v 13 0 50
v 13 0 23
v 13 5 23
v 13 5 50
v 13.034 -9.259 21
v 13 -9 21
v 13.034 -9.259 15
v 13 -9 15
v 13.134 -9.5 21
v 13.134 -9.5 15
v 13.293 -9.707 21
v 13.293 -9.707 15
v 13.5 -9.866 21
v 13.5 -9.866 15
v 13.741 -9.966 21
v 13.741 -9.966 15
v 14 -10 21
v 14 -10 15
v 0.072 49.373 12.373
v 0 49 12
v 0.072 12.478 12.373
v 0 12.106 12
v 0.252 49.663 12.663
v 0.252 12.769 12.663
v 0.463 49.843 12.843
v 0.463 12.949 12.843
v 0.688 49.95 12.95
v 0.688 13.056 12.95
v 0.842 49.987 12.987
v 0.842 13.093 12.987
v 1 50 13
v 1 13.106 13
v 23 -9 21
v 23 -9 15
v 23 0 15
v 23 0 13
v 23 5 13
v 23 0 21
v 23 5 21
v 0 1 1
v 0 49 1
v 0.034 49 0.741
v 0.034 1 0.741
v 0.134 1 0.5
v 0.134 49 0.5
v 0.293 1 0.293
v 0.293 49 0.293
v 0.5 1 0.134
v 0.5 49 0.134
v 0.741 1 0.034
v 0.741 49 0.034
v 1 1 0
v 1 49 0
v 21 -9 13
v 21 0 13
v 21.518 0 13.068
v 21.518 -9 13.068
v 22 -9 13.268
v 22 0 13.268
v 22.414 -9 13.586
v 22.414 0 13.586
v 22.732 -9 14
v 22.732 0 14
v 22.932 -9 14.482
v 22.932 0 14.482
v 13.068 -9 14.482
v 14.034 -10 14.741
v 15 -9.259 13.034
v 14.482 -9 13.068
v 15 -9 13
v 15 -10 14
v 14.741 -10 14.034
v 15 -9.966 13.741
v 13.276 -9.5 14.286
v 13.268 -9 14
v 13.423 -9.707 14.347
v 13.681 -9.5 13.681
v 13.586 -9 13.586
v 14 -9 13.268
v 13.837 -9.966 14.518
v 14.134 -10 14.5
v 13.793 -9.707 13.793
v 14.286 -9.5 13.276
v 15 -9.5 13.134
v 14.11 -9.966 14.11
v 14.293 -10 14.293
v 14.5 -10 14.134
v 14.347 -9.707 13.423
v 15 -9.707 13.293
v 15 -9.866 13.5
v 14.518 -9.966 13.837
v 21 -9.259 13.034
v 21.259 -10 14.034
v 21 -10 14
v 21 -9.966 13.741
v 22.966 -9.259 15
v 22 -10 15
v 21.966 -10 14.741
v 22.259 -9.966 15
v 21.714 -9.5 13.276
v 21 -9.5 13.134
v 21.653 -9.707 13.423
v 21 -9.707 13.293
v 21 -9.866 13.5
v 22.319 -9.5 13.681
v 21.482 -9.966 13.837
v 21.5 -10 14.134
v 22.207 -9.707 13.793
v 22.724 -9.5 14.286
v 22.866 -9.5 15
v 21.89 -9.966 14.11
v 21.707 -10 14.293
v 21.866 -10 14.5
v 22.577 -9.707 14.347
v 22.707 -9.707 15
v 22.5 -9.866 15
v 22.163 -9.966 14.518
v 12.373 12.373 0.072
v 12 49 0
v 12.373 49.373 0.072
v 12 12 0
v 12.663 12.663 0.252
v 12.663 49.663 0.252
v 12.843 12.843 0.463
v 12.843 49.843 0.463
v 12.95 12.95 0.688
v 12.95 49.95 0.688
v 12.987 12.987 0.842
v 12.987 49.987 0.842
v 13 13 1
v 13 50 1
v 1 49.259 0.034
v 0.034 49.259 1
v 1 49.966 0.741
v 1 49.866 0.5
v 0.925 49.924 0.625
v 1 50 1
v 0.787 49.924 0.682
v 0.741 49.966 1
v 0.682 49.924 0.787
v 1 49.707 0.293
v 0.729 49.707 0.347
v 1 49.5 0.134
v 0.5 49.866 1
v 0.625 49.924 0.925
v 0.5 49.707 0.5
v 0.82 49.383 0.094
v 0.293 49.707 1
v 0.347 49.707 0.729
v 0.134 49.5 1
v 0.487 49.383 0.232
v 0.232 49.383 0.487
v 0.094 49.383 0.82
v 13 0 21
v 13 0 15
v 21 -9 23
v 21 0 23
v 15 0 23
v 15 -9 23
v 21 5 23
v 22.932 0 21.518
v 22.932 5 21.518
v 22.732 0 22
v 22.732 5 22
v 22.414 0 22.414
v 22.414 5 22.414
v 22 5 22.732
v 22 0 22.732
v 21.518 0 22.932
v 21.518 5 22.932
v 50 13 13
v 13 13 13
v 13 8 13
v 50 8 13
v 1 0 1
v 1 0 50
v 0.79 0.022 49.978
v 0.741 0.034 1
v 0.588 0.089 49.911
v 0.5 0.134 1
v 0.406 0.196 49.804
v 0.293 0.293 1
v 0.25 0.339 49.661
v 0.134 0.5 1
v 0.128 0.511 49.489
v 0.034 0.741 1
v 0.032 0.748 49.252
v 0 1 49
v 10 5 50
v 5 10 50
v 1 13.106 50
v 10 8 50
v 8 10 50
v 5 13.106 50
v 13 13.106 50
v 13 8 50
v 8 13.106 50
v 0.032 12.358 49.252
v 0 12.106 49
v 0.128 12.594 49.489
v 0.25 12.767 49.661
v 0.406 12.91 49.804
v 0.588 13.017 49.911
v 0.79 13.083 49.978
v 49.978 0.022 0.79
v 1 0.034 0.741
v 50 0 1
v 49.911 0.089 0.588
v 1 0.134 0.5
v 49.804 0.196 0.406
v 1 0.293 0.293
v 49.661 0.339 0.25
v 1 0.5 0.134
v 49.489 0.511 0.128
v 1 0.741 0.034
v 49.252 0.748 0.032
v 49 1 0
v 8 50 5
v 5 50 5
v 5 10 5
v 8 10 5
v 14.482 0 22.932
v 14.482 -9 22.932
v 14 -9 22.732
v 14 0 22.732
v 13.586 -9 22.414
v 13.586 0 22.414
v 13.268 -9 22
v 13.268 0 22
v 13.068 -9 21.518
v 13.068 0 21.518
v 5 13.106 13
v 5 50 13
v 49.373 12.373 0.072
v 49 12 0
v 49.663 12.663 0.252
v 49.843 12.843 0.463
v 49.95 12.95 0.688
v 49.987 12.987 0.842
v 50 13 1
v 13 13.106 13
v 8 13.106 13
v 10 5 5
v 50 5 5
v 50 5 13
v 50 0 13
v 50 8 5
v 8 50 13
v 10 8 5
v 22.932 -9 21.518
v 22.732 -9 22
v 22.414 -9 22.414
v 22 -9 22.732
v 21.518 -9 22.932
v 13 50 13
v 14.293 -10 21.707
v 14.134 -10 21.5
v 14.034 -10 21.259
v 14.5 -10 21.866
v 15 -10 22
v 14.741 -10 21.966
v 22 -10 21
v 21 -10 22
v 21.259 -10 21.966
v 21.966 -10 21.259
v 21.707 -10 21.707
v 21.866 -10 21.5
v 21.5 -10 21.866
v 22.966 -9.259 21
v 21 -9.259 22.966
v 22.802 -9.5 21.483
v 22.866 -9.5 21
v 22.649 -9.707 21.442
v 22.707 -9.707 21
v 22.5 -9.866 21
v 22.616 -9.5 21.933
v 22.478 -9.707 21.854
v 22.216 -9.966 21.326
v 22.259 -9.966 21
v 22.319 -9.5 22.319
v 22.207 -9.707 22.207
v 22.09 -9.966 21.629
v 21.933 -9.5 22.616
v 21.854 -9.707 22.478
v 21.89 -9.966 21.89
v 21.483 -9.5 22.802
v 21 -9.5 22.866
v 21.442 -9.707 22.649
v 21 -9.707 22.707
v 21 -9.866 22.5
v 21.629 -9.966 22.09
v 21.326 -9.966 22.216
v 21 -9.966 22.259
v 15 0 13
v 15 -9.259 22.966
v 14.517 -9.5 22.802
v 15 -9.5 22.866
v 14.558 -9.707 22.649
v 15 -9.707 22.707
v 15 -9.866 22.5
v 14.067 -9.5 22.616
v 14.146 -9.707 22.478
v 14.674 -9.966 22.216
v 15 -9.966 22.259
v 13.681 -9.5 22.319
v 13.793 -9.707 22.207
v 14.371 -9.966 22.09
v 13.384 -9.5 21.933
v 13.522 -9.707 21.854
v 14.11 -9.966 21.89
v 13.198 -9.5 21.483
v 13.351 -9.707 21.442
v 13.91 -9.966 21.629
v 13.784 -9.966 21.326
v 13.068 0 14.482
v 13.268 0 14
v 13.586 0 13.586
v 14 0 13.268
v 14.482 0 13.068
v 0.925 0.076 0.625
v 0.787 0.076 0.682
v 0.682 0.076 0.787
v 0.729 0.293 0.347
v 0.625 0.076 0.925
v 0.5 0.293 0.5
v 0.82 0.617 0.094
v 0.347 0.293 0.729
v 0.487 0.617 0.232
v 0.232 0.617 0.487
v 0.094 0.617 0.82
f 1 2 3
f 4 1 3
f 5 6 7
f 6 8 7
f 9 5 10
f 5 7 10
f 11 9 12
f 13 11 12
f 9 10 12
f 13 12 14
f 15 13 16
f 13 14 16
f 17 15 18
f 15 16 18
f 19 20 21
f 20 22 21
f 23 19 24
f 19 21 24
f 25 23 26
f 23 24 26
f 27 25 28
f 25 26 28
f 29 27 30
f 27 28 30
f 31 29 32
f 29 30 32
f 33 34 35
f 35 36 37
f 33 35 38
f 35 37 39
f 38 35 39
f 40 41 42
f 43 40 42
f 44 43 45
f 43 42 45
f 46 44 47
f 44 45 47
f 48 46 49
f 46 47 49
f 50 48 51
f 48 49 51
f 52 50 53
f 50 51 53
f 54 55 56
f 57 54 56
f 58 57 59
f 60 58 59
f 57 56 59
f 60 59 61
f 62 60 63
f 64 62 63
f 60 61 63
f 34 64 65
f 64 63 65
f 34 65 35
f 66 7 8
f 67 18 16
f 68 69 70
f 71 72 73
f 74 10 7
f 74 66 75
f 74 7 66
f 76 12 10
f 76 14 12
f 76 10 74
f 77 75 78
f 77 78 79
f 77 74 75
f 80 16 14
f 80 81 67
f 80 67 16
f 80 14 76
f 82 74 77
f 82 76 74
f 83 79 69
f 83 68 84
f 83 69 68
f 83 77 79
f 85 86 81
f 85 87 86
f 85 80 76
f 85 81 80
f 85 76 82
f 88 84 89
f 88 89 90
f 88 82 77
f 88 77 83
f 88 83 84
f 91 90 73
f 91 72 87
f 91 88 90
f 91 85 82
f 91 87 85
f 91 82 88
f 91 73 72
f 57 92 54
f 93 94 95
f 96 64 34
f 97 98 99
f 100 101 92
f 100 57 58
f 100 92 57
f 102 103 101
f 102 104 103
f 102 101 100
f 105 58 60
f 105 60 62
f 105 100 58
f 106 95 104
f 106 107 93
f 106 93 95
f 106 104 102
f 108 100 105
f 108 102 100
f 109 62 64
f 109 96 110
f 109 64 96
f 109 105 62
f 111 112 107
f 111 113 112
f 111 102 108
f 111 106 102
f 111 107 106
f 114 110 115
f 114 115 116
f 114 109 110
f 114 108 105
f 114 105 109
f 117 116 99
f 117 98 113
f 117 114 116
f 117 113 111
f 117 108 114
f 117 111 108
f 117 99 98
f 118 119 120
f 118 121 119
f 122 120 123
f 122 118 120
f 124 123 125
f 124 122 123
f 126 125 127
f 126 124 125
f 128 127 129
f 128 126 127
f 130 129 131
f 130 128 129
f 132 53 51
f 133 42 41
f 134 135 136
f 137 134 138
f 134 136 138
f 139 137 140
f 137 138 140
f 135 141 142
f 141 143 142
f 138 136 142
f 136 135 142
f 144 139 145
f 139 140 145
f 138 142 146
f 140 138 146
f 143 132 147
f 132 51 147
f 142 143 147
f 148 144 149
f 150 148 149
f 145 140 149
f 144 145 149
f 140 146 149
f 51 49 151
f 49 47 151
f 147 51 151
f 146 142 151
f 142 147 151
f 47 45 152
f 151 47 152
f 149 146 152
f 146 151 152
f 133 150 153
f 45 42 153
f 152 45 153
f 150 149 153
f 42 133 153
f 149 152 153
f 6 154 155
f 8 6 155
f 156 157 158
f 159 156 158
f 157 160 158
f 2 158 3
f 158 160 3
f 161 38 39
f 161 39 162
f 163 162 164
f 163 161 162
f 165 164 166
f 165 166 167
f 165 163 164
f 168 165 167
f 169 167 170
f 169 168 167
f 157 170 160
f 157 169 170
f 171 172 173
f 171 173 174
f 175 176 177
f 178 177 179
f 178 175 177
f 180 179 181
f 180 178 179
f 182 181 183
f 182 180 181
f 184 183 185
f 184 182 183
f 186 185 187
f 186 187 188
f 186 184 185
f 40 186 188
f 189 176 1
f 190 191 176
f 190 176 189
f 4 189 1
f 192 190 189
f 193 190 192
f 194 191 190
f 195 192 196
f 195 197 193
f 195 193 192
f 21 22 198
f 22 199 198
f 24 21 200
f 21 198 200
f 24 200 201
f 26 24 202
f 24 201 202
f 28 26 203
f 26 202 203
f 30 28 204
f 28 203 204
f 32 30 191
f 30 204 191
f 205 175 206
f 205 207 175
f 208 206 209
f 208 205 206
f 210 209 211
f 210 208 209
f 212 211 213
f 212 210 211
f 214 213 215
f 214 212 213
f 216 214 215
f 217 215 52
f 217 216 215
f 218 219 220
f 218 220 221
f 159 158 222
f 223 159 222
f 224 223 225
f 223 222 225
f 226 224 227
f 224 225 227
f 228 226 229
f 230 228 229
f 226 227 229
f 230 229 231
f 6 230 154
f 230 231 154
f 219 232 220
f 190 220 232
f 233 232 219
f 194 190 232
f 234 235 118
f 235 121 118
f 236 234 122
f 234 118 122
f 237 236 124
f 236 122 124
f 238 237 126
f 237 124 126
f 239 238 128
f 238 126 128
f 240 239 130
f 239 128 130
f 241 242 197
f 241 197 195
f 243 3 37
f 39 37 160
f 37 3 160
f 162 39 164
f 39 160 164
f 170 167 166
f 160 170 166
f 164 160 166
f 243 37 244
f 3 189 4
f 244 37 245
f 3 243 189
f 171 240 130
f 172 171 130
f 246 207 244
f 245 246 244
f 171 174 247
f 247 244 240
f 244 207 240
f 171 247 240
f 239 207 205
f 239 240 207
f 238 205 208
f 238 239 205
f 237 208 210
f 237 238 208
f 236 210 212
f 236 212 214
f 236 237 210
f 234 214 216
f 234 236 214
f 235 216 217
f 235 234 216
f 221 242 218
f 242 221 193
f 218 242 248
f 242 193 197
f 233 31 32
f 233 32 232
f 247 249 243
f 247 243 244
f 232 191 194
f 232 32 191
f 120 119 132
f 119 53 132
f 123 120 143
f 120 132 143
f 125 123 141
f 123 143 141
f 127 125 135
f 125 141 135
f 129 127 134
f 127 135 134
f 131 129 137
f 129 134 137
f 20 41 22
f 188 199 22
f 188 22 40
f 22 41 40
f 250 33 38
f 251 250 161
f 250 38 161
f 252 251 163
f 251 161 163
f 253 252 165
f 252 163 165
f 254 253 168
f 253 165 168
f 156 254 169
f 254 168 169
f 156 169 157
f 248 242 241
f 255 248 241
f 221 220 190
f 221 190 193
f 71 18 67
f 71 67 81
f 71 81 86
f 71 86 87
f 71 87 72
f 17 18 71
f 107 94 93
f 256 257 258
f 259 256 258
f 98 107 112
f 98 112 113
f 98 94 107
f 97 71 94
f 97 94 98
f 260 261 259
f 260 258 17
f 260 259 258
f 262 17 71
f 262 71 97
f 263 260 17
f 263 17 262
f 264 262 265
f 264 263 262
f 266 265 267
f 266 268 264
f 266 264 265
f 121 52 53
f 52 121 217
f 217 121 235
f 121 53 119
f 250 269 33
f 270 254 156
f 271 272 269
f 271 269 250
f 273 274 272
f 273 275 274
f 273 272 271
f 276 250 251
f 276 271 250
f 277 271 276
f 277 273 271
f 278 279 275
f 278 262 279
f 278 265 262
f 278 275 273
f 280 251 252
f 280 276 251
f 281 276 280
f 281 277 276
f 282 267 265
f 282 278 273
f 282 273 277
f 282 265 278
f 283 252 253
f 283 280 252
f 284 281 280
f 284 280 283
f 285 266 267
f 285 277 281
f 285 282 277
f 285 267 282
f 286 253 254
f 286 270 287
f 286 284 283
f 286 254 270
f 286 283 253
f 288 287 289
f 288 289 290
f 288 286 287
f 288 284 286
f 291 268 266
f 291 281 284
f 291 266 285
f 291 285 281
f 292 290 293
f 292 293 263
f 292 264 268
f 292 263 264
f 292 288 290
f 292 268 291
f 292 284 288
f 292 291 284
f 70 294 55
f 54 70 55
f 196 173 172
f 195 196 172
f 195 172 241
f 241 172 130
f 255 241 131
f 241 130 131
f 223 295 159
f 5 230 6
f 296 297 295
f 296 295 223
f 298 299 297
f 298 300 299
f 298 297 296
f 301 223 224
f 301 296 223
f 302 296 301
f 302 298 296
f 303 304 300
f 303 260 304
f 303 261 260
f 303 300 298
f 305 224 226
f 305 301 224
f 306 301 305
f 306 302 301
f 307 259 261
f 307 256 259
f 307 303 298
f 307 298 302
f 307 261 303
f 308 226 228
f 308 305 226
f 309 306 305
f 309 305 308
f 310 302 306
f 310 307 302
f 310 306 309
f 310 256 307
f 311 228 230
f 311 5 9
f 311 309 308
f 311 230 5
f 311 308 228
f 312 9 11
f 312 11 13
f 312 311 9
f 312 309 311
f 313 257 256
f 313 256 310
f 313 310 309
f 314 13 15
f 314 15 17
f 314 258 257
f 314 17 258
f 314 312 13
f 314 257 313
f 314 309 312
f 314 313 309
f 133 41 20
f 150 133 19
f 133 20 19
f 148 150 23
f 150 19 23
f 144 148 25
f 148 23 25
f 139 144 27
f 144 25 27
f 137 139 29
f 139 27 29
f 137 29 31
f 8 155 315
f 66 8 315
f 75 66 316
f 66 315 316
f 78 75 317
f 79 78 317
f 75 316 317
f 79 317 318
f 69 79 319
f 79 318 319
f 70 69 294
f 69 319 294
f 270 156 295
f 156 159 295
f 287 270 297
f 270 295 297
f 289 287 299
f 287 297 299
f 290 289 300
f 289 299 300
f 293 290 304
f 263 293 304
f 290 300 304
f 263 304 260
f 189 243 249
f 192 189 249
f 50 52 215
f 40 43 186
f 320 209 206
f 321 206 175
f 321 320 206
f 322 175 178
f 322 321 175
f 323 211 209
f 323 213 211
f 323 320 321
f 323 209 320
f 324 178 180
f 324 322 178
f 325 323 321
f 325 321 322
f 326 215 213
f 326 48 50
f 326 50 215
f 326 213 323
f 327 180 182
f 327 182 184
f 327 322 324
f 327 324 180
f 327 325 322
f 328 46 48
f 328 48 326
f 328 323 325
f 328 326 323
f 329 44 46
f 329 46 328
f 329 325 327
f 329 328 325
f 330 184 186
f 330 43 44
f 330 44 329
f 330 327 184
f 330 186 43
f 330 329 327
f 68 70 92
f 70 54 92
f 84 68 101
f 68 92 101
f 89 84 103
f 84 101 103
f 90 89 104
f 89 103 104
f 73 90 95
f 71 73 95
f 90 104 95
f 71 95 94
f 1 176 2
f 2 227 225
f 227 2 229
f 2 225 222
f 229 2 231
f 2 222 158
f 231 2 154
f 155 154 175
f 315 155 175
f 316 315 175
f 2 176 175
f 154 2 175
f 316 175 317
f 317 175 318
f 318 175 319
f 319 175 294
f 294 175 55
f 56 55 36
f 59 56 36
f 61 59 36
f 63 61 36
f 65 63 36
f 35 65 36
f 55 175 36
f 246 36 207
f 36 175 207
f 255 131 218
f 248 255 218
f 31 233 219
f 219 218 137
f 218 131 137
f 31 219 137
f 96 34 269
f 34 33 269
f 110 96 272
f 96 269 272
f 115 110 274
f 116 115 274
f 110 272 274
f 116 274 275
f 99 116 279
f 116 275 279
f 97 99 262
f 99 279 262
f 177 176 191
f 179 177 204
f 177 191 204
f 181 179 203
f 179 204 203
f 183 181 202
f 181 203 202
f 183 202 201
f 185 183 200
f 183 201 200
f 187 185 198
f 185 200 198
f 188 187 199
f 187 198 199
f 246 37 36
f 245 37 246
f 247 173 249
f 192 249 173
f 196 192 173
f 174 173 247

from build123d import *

# Parameters (mm, degrees)
PAD_DEPTH     = 13
SKETCH001_W   = 13
SKETCH001_H   = 13.105825
PAD001_DEPTH  = 50
SKETCH002_W   = 70.608528
SKETCH002_H   = 3
SKETCH002_W_2 = 3
SKETCH002_H_2 = 60
POCKET_DEPTH  = 45
PAD003_DEPTH  = 5
PAD004_DEPTH  = 10
FILLET002_R   = 1
FILLET_R      = 1


with BuildPart() as part:
    # Sketch → Pad (new body)
    with BuildSketch(Plane.XY):
        Polygon((0, 0), (50, 0), (50, 13), (13, 13), (13, 50), (0, 50), align=None)
    extrude(amount=PAD_DEPTH)

    # Sketch001 → Pad001 (join)
    with BuildSketch(Plane.XY):
        with Locations((6.5, 6.5529125)):
            Rectangle(SKETCH001_W, SKETCH001_H)
    extrude(amount=PAD001_DEPTH)

    # Sketch002 (on Face7 of Pad001) → Pocket (cut)
    with BuildSketch(Plane.XY.offset(50)):
        with Locations((45.304264, 6.5)):
            Rectangle(SKETCH002_W, SKETCH002_H)
        with Locations((6.5, 40)):
            Rectangle(SKETCH002_W_2, SKETCH002_H_2)
    extrude(amount=-POCKET_DEPTH, mode=Mode.SUBTRACT)

    # Sketch004 → Pad003 (join)
    with BuildSketch(Plane.XZ):
        with BuildLine():
            Line((8, 8), (23, 8))
            Line((23, 8), (23, 21))
            ThreePointArc((23, 21), (22.4142135624, 22.4142135624), (21, 23))
            Line((21, 23), (8, 23))
            Line((8, 23), (8, 8))
        make_face()
    extrude(amount=-PAD003_DEPTH)

    # Sketch005 → Pad004 (join)
    with BuildSketch(Plane.XZ):
        with BuildLine():
            Line((21, 23), (15, 23))
            ThreePointArc((15, 23), (13.5857864376, 22.4142135623), (13, 20.9999999999))
            Line((13, 20.9999999999), (13, 15))
            ThreePointArc((13, 15), (13.5857864376, 13.5857864376), (15, 13))
            Line((15, 13), (21, 13))
            ThreePointArc((21, 13), (22.4142135624, 13.5857864376), (23, 15))
            Line((23, 15), (23, 20.9999999999))
            ThreePointArc((23, 20.9999999999), (22.4142135624, 22.4142135623), (21, 23))
        make_face()
    extrude(amount=PAD004_DEPTH)

    # Fillet002
    fillet002_edges = [part.edges().sort_by_distance(p)[0] for p in [
        (18, -10, 23),
        (13.585786, -10, 22.414214),
        (13, -10, 18),
        (13.585786, -10, 13.585786),
        (18, -10, 13),
        (22.414214, -10, 13.585786),
        (23, -10, 18),
        (22.414214, -10, 22.414214),
    ]]
    fillet(fillet002_edges, radius=FILLET002_R)

    # Fillet
    fillet_edges = [part.edges().sort_by_distance(p)[0] for p in [
        (0, 25, 0),
        (6.5, 50, 0),
        (13, 31.5, 0),
        (31.5, 13, 0),
        (50, 6.5, 0),
        (25, 0, 0),
        (0, 0, 25),
        (0, 6.552912, 50),
        (0, 13.105825, 31.5),
        (0, 31.552912, 13),
        (0, 50, 6.5),
    ]]
    fillet(fillet_edges, radius=FILLET_R)


solid = part.part
